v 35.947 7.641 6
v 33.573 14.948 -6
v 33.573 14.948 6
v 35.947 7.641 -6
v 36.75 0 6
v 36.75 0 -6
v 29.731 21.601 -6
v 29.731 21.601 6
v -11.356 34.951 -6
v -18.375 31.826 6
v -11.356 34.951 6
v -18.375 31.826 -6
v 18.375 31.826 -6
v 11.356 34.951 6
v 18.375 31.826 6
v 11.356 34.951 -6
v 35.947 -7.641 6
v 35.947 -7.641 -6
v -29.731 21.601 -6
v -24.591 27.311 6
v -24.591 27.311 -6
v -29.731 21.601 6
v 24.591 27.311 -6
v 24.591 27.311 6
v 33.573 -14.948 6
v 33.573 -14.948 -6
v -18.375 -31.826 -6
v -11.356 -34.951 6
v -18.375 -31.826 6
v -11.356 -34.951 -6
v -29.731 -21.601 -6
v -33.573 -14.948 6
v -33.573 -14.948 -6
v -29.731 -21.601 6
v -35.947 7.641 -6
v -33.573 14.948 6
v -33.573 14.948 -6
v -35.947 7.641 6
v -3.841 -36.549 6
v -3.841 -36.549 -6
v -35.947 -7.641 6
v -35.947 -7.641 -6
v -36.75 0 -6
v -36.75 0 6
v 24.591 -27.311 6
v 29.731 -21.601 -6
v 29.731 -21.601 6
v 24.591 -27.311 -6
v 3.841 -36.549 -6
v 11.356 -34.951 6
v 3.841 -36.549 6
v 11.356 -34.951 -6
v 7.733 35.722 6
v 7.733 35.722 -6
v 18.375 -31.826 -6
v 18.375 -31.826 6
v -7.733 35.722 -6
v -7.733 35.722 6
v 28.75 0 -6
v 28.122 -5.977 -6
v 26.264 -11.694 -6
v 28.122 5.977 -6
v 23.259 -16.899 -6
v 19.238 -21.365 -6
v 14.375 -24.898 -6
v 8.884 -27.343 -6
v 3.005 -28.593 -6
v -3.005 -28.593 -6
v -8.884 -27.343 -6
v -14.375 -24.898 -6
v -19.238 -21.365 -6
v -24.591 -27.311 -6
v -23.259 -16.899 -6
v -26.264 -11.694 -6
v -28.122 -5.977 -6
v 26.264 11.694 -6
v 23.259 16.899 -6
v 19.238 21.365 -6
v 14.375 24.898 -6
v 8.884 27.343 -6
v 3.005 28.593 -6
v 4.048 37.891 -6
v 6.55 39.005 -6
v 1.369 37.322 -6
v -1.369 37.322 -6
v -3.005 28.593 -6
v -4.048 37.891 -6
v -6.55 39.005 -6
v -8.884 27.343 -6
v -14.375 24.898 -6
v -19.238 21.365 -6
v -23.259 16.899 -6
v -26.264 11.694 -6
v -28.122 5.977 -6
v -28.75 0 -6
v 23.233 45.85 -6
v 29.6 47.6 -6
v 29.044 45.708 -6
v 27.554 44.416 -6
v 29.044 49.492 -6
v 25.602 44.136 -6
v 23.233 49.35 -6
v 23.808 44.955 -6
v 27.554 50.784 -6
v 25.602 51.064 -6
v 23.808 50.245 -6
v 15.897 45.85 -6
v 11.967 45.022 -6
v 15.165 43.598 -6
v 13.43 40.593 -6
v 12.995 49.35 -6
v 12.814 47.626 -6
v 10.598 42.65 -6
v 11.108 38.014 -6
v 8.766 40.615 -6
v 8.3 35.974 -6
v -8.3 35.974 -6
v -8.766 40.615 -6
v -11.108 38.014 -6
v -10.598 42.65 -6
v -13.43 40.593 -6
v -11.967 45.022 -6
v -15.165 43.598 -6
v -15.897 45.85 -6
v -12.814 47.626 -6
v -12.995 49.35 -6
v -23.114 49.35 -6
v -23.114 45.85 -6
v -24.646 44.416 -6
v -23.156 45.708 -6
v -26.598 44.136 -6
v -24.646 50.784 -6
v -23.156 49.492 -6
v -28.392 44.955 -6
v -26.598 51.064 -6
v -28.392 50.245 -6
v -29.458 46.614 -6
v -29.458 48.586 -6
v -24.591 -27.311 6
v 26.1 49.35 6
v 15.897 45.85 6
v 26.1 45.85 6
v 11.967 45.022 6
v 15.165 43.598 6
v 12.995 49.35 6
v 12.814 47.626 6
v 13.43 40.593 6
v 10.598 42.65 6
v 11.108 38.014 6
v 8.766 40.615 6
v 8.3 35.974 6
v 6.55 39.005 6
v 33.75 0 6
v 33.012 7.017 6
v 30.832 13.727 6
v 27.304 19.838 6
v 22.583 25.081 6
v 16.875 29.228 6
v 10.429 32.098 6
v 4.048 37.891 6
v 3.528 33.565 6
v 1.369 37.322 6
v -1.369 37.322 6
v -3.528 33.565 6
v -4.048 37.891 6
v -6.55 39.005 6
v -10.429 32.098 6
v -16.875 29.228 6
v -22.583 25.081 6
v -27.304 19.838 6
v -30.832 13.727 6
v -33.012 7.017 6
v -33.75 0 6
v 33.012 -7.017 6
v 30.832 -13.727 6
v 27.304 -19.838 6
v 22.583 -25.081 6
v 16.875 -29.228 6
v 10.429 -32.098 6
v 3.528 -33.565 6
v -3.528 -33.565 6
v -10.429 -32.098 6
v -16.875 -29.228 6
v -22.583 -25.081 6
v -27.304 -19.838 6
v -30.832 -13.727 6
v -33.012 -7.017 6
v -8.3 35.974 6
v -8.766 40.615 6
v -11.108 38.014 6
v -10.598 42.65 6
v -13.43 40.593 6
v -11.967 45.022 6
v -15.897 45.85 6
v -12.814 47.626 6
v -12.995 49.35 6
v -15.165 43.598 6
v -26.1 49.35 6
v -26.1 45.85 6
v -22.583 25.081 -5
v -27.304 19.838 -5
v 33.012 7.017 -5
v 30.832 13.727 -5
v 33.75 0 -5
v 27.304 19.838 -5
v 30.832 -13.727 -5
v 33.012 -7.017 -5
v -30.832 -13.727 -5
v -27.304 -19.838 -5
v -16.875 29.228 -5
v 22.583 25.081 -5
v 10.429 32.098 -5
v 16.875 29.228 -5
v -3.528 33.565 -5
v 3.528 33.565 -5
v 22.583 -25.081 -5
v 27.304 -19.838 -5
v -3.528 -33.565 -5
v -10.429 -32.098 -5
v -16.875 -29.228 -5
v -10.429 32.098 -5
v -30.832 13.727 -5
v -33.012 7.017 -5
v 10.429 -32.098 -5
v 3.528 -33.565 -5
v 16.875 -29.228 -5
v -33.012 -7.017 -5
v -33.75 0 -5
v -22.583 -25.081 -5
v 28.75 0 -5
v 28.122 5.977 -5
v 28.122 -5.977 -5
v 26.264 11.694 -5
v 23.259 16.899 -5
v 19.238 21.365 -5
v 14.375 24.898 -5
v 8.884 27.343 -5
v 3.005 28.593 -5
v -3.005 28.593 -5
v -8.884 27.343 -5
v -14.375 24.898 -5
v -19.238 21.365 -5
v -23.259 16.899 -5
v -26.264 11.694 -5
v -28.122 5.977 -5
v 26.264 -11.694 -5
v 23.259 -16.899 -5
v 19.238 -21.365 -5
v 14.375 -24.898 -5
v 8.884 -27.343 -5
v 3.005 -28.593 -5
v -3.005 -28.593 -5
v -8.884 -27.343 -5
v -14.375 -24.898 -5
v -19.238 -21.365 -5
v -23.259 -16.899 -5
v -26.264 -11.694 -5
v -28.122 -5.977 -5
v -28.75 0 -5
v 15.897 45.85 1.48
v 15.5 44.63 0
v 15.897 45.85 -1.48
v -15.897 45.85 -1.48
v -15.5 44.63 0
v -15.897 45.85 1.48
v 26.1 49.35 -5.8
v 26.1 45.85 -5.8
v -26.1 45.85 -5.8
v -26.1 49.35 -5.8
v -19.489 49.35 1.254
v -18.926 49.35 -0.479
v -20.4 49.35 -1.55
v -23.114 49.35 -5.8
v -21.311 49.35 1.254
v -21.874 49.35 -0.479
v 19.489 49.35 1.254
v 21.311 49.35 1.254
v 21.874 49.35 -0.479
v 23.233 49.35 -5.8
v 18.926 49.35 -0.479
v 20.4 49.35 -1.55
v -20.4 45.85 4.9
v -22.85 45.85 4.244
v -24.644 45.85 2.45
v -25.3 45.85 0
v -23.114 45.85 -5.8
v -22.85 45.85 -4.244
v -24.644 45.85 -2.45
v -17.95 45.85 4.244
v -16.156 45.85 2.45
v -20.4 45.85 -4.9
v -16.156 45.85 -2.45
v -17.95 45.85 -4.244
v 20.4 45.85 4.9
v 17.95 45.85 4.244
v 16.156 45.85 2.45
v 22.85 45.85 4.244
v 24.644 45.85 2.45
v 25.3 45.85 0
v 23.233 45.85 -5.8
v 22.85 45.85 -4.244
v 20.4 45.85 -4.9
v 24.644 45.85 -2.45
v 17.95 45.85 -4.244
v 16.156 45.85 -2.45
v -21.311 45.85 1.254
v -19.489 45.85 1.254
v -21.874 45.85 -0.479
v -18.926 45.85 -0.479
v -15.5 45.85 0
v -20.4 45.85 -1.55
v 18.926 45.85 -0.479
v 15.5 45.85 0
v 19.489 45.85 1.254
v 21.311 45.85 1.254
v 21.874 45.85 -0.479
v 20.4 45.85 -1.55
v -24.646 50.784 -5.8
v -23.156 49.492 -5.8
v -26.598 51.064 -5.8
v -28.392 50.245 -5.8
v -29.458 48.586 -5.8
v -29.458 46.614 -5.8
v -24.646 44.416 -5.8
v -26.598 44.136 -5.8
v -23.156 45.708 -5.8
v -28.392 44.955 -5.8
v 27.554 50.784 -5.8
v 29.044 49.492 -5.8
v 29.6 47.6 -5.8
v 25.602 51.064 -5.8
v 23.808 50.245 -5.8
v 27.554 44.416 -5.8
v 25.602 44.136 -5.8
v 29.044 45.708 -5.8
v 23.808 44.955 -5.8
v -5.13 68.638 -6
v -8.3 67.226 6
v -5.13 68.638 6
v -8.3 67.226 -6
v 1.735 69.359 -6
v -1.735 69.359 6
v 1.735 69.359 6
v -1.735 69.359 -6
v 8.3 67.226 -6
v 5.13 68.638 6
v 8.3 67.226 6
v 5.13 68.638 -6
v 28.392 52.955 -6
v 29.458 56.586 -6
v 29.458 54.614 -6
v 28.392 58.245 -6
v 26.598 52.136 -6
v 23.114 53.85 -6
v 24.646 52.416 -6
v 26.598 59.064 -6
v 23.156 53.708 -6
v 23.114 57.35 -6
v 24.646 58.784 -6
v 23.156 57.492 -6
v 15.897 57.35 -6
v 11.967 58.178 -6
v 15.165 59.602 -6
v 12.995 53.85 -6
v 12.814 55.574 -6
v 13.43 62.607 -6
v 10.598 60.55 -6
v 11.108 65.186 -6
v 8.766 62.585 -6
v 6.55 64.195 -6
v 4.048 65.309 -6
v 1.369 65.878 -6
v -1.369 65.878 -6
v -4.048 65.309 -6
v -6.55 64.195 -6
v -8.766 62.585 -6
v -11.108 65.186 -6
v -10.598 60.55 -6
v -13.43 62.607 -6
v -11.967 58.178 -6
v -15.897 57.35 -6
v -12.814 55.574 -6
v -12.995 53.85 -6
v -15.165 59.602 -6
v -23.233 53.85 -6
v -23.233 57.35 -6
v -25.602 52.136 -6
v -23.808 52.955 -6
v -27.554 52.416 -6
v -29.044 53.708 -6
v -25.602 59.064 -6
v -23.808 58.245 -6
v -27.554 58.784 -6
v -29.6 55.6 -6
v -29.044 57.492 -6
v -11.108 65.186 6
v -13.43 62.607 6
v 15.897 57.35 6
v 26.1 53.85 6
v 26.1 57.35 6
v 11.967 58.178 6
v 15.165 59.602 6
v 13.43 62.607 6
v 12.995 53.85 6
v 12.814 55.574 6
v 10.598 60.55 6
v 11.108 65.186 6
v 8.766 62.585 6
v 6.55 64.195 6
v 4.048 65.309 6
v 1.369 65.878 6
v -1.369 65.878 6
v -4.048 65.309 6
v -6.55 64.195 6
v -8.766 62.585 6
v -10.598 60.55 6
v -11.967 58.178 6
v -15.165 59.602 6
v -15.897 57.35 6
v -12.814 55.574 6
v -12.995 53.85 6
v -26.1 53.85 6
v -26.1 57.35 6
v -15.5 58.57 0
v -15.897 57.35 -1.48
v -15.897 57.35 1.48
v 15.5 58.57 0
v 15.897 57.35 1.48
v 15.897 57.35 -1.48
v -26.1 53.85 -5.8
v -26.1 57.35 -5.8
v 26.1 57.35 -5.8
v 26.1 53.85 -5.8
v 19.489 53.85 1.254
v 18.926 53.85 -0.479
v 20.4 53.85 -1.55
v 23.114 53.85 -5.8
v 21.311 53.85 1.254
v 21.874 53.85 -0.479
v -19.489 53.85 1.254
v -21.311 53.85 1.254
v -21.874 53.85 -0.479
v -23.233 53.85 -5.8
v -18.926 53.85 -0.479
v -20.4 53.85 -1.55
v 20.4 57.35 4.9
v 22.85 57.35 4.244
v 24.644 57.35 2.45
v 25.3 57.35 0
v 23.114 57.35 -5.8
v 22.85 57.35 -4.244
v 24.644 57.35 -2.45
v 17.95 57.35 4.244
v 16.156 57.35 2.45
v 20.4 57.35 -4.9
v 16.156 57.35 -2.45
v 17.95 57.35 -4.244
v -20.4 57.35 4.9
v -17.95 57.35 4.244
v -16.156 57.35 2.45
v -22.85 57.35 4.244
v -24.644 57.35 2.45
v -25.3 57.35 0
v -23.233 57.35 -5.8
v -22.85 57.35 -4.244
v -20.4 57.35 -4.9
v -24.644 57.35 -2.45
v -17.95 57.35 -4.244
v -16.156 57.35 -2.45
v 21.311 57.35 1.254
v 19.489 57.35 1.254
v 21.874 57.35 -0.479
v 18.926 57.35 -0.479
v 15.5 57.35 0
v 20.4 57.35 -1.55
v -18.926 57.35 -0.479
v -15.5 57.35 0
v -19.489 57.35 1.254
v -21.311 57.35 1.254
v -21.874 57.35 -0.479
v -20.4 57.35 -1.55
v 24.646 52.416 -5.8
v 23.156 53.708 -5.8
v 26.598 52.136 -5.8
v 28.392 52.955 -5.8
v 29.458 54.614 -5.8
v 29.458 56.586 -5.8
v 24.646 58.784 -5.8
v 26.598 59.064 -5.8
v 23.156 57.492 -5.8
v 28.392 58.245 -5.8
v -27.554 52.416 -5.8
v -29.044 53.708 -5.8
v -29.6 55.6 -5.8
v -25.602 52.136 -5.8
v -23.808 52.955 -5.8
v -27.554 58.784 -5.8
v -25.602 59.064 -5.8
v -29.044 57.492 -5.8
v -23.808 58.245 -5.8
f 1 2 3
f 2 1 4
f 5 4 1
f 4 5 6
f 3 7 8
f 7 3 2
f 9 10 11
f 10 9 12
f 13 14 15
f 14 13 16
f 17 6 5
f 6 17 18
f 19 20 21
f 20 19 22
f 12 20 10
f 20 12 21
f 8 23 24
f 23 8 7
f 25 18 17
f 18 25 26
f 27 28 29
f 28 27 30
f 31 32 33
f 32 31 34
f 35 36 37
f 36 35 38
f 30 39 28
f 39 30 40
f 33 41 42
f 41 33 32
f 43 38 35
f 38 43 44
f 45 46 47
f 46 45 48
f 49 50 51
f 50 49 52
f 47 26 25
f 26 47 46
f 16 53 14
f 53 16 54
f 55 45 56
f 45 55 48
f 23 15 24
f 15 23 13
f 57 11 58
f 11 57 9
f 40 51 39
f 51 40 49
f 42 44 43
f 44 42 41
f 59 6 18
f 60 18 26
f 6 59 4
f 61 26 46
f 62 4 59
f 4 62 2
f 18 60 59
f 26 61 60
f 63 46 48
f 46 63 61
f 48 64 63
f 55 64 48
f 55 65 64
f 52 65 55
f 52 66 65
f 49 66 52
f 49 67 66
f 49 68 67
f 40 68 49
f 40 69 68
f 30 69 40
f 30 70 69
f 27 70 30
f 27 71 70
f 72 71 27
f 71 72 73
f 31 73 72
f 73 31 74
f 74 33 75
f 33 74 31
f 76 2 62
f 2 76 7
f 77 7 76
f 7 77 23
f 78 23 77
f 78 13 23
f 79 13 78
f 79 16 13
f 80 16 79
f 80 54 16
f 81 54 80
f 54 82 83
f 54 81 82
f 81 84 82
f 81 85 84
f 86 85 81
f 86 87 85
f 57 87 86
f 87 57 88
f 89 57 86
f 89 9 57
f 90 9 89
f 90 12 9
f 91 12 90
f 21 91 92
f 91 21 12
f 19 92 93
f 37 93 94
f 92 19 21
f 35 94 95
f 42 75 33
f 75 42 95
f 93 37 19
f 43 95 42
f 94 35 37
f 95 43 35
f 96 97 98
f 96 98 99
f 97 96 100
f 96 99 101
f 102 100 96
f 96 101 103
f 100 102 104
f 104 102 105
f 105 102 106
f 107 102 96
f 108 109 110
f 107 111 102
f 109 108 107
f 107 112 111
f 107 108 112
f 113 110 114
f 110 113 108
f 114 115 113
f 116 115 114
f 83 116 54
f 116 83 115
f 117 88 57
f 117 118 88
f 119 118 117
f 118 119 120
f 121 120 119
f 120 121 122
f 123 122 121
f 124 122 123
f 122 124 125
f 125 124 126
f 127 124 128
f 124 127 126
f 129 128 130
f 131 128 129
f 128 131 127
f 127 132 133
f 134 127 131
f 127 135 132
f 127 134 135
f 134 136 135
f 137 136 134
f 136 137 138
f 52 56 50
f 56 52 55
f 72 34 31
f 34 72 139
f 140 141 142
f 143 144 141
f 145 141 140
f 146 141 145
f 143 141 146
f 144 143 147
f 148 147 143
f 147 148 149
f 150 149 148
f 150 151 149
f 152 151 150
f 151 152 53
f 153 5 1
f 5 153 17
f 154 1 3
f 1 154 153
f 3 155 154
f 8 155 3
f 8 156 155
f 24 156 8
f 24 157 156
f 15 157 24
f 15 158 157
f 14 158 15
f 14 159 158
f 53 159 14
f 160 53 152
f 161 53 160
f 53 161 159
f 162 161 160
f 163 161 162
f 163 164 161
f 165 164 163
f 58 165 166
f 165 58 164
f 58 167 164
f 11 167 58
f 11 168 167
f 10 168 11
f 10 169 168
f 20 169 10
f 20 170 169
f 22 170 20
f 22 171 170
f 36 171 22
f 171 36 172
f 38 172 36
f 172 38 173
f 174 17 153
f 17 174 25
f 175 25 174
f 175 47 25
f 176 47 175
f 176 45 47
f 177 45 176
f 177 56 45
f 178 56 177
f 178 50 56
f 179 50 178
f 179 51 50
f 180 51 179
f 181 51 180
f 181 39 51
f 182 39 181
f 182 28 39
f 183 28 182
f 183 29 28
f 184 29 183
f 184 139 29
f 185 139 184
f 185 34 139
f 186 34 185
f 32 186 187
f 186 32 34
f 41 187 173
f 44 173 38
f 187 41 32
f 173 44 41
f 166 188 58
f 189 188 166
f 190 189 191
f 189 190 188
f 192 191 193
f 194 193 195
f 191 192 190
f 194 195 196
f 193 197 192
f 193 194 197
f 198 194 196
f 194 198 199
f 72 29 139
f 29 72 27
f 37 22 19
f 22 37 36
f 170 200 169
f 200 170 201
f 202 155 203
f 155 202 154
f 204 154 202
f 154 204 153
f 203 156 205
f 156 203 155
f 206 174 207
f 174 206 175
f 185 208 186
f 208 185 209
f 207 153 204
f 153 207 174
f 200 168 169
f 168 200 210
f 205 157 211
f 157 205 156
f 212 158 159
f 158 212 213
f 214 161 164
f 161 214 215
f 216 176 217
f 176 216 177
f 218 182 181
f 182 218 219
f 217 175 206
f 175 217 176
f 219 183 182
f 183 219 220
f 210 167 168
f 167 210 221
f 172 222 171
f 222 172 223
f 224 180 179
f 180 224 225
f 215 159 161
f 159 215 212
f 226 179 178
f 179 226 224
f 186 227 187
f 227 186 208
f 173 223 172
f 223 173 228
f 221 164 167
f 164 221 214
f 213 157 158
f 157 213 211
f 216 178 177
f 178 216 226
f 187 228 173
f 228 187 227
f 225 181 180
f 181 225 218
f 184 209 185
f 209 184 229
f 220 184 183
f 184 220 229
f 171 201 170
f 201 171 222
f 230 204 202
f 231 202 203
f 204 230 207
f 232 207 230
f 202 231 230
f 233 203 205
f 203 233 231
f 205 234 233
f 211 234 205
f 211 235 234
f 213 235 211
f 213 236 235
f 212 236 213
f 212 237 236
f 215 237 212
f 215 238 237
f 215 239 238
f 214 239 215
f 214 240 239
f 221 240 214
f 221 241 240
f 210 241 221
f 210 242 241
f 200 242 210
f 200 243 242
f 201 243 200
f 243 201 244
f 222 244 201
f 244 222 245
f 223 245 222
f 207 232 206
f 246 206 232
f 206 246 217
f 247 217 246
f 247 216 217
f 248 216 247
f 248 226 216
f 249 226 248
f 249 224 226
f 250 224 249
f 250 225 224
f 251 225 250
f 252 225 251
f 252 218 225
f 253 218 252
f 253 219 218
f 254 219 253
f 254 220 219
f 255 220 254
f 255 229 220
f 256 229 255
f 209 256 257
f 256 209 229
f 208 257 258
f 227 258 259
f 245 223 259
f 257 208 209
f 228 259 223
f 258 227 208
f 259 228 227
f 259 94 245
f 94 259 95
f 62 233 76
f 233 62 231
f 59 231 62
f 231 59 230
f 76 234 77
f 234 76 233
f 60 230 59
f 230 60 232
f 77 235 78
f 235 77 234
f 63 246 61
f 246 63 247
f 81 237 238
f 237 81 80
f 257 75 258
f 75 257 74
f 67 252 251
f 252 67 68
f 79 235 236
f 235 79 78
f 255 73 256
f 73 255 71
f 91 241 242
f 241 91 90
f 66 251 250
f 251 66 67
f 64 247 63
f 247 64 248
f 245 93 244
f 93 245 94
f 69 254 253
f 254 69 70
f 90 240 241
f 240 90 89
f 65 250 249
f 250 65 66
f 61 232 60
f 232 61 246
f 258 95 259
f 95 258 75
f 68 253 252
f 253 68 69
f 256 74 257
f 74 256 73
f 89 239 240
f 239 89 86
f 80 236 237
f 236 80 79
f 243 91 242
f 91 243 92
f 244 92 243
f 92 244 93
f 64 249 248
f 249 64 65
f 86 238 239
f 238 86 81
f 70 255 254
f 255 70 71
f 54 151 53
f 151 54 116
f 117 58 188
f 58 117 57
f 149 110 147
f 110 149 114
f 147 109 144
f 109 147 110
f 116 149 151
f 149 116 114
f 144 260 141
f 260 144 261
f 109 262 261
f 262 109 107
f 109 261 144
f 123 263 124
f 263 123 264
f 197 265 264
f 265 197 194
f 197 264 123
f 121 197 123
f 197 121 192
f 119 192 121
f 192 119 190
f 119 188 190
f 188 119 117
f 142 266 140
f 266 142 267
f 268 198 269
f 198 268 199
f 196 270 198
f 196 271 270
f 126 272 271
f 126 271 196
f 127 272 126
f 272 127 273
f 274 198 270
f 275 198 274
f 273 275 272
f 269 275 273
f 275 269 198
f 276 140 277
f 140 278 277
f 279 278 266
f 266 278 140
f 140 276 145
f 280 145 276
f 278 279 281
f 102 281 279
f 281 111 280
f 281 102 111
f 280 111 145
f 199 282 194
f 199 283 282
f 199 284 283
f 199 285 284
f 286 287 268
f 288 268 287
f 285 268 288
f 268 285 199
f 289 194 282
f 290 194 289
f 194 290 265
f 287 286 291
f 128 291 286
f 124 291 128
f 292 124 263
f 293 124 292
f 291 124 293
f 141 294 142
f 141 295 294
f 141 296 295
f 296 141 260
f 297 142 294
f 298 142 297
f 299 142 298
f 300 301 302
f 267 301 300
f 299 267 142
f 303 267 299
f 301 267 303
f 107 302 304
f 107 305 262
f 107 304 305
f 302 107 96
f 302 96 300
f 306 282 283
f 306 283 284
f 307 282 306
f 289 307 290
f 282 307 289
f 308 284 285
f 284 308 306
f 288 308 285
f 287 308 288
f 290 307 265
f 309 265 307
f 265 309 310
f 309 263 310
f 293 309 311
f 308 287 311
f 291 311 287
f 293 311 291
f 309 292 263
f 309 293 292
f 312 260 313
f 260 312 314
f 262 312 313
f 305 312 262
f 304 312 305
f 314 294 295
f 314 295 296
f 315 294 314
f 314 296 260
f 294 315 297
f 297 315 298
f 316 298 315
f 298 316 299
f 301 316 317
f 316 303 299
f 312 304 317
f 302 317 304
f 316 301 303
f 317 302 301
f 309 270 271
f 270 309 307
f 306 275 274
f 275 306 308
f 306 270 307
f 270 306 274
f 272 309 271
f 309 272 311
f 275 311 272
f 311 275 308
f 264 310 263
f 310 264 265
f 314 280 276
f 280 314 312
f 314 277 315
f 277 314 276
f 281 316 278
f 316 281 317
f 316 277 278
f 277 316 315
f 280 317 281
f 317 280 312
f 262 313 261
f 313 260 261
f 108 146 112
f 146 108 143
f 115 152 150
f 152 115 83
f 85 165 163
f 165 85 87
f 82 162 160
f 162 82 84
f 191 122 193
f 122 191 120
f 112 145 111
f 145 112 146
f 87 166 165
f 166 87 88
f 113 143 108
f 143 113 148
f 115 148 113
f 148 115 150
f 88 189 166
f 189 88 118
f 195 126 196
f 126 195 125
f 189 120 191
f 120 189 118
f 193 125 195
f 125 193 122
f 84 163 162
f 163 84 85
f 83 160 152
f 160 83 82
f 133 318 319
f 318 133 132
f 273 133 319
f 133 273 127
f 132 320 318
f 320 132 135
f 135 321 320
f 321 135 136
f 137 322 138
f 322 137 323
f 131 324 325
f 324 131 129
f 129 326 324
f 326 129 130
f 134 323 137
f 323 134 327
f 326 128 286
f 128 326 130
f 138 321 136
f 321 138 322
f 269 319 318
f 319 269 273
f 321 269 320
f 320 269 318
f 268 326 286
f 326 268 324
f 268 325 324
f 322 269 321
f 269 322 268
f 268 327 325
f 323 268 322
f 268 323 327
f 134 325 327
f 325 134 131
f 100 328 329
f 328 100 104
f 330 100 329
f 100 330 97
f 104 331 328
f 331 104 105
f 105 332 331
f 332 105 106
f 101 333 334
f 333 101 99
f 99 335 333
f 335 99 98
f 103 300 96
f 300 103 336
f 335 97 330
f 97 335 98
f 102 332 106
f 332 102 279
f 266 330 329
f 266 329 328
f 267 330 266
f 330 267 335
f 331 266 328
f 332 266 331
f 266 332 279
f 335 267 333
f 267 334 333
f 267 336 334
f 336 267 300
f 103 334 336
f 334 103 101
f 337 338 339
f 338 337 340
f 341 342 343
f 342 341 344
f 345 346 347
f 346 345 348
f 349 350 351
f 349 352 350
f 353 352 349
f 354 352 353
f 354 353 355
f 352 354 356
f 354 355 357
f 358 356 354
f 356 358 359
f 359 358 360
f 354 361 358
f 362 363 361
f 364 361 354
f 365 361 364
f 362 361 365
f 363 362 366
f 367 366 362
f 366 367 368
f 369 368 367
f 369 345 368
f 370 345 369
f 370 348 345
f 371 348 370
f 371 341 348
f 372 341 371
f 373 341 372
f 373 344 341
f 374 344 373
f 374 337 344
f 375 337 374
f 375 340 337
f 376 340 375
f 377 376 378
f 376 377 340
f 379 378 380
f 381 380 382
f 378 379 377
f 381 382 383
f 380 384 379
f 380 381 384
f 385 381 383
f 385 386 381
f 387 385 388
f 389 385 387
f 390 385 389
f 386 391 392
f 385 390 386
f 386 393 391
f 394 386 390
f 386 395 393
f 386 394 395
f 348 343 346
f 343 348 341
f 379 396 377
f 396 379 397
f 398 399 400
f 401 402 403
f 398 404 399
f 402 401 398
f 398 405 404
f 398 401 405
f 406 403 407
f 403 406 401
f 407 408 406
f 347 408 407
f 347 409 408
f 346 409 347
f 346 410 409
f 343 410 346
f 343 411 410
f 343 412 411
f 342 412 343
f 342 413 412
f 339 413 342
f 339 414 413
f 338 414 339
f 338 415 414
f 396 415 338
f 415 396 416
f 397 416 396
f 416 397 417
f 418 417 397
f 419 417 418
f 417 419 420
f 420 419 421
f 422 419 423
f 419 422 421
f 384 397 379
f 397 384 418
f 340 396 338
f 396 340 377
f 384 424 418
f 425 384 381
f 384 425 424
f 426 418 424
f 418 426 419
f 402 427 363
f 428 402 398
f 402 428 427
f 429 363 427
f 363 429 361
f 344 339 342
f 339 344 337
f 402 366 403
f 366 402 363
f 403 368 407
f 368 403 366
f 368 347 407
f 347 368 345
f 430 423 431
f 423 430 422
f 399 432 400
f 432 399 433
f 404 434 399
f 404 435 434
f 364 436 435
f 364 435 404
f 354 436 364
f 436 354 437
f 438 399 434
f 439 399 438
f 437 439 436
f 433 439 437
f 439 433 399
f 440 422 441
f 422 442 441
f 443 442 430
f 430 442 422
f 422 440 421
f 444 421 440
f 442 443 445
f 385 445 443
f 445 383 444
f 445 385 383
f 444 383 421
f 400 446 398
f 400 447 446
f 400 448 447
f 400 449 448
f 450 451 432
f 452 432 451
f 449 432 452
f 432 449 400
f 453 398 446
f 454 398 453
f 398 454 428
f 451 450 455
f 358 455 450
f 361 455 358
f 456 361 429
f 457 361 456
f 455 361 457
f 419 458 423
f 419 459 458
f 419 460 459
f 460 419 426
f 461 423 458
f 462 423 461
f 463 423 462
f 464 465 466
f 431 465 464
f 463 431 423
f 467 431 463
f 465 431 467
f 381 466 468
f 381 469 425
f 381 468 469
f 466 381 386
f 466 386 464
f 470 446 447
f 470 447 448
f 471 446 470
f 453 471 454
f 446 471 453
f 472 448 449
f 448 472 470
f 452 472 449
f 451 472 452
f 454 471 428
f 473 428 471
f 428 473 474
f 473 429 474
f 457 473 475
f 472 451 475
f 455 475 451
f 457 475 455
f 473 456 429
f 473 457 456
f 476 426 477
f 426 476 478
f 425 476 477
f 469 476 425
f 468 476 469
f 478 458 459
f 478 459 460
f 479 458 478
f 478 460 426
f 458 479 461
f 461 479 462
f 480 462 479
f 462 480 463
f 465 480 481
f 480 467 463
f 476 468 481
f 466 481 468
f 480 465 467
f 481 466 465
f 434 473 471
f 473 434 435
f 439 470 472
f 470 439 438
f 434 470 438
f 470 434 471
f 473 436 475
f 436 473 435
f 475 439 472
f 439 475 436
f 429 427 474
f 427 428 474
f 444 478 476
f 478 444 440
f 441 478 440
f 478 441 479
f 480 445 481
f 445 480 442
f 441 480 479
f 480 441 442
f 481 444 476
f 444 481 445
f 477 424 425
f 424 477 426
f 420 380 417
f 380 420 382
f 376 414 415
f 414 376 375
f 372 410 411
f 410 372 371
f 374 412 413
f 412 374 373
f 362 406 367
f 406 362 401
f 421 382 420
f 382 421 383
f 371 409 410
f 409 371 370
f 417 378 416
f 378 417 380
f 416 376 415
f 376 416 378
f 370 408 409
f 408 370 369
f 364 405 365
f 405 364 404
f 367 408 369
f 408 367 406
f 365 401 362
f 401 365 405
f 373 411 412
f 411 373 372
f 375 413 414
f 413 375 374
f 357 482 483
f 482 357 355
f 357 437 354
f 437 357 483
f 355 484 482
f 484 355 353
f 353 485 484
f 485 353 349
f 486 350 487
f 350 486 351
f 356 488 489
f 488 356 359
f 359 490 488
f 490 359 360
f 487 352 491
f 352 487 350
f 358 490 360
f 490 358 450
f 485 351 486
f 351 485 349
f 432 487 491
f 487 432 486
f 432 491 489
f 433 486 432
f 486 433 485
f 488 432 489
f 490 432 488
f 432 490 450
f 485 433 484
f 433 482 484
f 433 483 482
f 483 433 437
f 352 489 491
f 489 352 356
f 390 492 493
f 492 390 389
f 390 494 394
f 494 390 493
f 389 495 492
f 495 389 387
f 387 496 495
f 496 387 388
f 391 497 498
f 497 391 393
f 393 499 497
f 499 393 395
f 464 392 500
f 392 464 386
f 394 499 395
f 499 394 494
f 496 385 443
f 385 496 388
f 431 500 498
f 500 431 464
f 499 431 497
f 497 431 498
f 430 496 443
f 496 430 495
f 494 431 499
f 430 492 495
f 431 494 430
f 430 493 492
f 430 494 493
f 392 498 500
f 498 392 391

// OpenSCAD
// [FL_INDEX: keywords="openscad, 3d_parametric, Bottle_Holder__Lawnmower, csg_solid" | COT="Parametric OpenSCAD design from 3DCodeverse"]
// Title: Bottle Holder (Lawnmower)

/* [Bottle] */

// diameter of bottle to be held (plus any extra spacing)
bottle_diam = 67.5;

// height of bottle holder
holder_height = 12;

// thickness of bottle holder
holder_thick = 3;

// thickness of holder bottom (0 for none)
holder_bottom_thick = 1;

// width of holder bottom lip (0 for none)
holder_bottom_lip = 5;


/* [Mount] */

// diameter of pole to be mounted to
mount_diam = 26.2;

// height of mount
mount_height = holder_height;

// thickness of mount
mount_thick = 3.5;

// width of wing for bolt
bracket_width = 13;

// thickness of wing
bracket_thick = 3.5;

// cut offset of wing to improve pole grip
bracket_offset = 1;

// offset from wing edge for bolt center
bolt_offset = 5.7;

// diameter of bolt
bolt_diam = 3.1;

// diameter of bolt washer
washer_diam = 9.8;


/* [Helpers] */

// generate build-platform corner helpers?
generate_holddown = 1; // [0:no, 1:yes]


////////////////////////////////////////////////////////////////////////

bottle_rad = bottle_diam/2;
mount_rad = mount_diam/2;
bolt_rad = bolt_diam/2;
washer_rad = washer_diam/2;

////////////////////////////////////////////////////////////////////////

holder();

translate([0, bottle_rad+max(holder_thick,mount_thick)+mount_rad, 0])
{
    mount();

    translate([0, mount_thick-bracket_offset, 0])
    rotate([0, 0, 180])
    mount();
}

////////////////////////////////////////////////////////////////////////

module holder()
{
    // base shape
    difference()
    {
        // outer ring
        cylinder(r=bottle_rad+holder_thick, h=holder_height, center=true);

        // cut out bottle
        cylinder(r=bottle_rad, h=holder_height+0.1, center=true);
    }

    // something to rest the bottle against?
    if(holder_bottom_thick > 0 && holder_bottom_lip > 0)
    {
        translate([0, 0, (holder_bottom_thick-holder_height)/2])
        difference()
        {
            cylinder(r=bottle_rad+0.1, h=holder_bottom_thick, center=true);

            cylinder(r=bottle_rad-holder_bottom_lip, h=holder_bottom_thick+0.1, center=true);
        }
    }
}

module mount()
{
    wing_off = mount_rad+bracket_width;
    holddown = 0.2;

    difference()
    {
        // base shape
        union()
        {
            // outer ring
            cylinder(r=mount_rad+mount_thick, h=mount_height, center=true);

            // wing
            translate([0, -bracket_thick/2-bracket_offset, 0])
            cube([mount_diam+bracket_width*2, bracket_thick, mount_height], center=true);
        }

        // cut out the pole
        cylinder(r=mount_rad, h=mount_height+0.1, center=true);

        // crop the wing/ring to inset that we selected
        translate([0, mount_diam-bracket_offset, 0])
        cube(mount_diam*2, center=true);

        // cut out two bolt holes
        for(i=[-1, 1])
        translate([i*(wing_off-bolt_offset), -bracket_thick/2-bracket_offset, 0])
        {
            // bolt itself
            rotate([90, 90, 0])
            cylinder(r=bolt_rad, h=bracket_thick*2, center=true);

            // cut into wall to fit washer
            translate([0, -bracket_thick, 0])
            rotate([90, 90, 0])
            cylinder(r=washer_rad, h=bracket_thick, center=true, $fn=12);
        }
    }

    // build platform helper?
    if(generate_holddown)
    {
        for(i=[-1, 1])
        translate([i*(wing_off), -bracket_thick/2-bracket_offset, -mount_height/2+holddown/2])
        cylinder(r=bracket_thick, h=holddown, center=true);
    }
}
